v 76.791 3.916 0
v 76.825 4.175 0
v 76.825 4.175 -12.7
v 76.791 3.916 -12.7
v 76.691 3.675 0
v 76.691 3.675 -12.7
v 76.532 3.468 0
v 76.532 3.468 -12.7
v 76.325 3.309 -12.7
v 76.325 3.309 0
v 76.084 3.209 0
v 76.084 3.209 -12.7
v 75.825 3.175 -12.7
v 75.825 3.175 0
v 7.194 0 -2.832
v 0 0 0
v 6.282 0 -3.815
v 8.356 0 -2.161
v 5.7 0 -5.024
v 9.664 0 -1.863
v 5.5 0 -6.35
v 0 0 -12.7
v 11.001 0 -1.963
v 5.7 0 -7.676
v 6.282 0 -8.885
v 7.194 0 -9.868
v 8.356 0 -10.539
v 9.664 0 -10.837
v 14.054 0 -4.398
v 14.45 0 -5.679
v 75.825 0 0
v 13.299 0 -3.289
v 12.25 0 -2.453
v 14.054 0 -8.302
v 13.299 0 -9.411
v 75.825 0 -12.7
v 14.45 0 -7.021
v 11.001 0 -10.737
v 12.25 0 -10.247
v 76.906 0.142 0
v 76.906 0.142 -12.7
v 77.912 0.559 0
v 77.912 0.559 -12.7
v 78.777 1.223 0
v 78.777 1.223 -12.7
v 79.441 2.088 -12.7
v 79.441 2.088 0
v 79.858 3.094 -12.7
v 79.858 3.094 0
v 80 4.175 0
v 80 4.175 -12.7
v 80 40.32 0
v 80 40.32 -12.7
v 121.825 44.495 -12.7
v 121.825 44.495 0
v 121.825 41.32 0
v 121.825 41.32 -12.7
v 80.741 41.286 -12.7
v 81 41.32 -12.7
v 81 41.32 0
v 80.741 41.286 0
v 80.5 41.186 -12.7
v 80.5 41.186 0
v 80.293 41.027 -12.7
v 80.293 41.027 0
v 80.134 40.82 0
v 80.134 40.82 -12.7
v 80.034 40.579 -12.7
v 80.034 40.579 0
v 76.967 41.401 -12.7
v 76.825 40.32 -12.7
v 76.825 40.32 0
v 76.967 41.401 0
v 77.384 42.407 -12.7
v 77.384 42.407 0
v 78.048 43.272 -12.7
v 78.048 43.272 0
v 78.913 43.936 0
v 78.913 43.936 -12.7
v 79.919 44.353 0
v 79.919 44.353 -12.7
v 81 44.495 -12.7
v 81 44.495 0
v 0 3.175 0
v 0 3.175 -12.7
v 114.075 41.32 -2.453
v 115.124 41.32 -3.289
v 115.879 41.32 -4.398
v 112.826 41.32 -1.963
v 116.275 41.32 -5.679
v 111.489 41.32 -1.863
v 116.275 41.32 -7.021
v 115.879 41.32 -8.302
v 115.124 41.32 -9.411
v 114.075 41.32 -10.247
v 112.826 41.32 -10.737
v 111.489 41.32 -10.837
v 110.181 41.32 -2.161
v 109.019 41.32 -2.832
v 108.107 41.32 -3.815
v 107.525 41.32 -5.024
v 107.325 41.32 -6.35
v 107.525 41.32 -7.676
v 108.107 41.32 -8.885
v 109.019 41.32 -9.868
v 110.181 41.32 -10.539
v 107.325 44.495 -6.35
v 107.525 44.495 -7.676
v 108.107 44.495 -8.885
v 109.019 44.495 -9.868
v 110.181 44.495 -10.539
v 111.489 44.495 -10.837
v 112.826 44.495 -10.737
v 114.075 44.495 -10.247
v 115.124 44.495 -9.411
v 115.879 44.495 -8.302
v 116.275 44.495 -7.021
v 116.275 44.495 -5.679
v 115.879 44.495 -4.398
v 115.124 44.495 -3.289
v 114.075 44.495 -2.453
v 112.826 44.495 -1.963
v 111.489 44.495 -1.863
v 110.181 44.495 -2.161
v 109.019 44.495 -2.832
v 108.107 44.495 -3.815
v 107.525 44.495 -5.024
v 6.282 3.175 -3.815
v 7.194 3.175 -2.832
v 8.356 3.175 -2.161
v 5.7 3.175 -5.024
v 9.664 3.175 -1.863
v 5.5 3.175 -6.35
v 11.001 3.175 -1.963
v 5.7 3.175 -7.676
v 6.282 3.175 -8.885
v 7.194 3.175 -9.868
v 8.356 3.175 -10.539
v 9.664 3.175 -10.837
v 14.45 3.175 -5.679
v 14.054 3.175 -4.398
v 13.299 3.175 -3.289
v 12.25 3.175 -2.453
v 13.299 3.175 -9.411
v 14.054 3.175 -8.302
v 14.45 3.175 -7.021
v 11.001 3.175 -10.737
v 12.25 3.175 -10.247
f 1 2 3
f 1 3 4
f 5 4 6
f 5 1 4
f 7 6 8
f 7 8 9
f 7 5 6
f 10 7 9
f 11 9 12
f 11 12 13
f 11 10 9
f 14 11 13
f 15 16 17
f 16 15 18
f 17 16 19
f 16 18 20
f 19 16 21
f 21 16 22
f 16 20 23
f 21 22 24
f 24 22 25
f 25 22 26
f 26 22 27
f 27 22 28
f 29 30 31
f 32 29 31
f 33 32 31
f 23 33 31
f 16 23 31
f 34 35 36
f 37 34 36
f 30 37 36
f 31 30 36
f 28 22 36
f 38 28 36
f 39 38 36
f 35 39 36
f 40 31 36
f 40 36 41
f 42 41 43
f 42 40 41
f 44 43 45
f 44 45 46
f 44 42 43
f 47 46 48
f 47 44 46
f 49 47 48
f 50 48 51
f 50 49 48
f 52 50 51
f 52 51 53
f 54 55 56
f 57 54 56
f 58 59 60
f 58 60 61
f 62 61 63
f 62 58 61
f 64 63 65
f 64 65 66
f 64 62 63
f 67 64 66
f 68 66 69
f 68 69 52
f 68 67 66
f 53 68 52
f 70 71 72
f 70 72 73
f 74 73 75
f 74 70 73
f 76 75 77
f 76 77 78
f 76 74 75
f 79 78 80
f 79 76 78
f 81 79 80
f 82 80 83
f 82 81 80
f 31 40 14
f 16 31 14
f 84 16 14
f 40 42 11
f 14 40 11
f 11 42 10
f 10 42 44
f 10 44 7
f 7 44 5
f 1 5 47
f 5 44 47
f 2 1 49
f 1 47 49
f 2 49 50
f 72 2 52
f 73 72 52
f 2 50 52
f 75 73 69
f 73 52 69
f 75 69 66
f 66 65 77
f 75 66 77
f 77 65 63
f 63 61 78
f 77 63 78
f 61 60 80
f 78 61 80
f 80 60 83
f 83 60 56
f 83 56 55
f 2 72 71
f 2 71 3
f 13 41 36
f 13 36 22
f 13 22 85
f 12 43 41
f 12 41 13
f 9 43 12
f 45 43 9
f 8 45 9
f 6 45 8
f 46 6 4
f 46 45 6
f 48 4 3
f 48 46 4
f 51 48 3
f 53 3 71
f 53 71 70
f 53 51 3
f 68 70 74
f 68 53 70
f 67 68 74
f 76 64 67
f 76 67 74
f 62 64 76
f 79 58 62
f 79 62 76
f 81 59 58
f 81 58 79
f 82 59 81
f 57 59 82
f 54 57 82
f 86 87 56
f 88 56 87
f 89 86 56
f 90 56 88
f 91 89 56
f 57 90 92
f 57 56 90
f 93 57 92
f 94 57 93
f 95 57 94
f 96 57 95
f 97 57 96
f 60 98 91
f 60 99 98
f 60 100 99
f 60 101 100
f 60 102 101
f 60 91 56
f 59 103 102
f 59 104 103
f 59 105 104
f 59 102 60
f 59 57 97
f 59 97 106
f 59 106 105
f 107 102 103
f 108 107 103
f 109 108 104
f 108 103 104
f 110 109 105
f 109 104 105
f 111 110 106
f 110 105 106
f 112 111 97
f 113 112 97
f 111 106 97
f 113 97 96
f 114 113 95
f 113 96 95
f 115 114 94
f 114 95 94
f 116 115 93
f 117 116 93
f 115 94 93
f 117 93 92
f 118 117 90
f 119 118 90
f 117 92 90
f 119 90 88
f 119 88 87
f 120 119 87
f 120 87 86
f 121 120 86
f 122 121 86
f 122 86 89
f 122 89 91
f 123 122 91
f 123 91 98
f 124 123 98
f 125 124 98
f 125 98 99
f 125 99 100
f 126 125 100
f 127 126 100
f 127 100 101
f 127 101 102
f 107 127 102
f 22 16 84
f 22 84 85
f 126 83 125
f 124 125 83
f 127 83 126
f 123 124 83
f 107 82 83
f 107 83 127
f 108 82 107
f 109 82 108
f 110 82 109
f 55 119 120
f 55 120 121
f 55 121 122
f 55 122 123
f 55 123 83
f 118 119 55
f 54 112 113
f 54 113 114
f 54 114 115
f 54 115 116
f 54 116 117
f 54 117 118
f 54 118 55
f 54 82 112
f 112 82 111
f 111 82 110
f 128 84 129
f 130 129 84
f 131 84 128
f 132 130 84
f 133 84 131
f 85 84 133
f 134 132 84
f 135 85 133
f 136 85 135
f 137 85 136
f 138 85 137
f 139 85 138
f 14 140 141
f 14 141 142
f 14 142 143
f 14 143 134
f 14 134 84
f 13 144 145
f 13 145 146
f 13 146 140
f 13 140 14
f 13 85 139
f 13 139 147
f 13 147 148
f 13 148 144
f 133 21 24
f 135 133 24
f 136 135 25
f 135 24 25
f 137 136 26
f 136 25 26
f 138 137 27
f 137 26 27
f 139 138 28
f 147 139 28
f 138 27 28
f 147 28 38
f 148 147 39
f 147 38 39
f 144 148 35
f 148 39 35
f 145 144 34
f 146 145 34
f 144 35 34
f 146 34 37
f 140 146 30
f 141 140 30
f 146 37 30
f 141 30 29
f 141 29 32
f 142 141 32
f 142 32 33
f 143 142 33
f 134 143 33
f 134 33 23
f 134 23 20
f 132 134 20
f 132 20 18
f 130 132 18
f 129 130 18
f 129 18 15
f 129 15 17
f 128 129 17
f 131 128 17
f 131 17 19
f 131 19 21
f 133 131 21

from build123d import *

# Parameters (mm, degrees)
SKETCH1_W                    = 80
SKETCH1_H                    = 12.7
BOSS_EXTRUDE1_DEPTH          = 3.175
EDGE_FLANGE1_STRIP_W         = 14.7
EDGE_FLANGE1_STRIP_H         = 3.175
EDGE_FLANGE1_STRIP_CUT_DEPTH = 12.7
EDGE_FLANGE1_DEPTH           = 12.7
EDGE_FLANGE2_STRIP_W         = 14.7
EDGE_FLANGE2_STRIP_H         = 3.175
EDGE_FLANGE2_STRIP_CUT_DEPTH = 12.7
EDGE_FLANGE2_DEPTH           = 12.7
M8_CLEARANCE_HOLE1_D         = 9


# Sheet-metal steps are written as plain solids
with BuildPart() as part:
    # Sketch1 → Boss-Extrude1 (new body)
    with BuildSketch(Plane(origin=(0, 0, 0), x_dir=(1, 0, 0), z_dir=(0, 1, 0))):
        with Locations((40, 6.35)):
            Rectangle(SKETCH1_W, SKETCH1_H)
    extrude(amount=BOSS_EXTRUDE1_DEPTH)

    # Edge-Flange1 strip (across the edge) → Edge-Flange1 strip cut (cut)
    with BuildSketch(Plane(origin=(80, 3.175, 0), x_dir=(-1, 0, 0), z_dir=(0, 0, -1))):
        with Locations((-3.175, -1.5875)):
            Rectangle(EDGE_FLANGE1_STRIP_W, EDGE_FLANGE1_STRIP_H)
    extrude(amount=EDGE_FLANGE1_STRIP_CUT_DEPTH, mode=Mode.SUBTRACT)

    # Edge-Flange1 section (across the edge) → Edge-Flange1 (add)
    with BuildSketch(Plane(origin=(80, 3.175, 0), x_dir=(-1, 0, 0), z_dir=(0, 0, -1))):
        with BuildLine():
            Line((0, 1), (0, 41.32))
            Line((0, 41.32), (3.175, 41.32))
            Line((3.175, 41.32), (3.175, 1))
            ThreePointArc((3.175, 1), (3.467893219, 0.292893219), (4.175, 0))
            Line((4.175, 0), (4.175, -3.175))
            ThreePointArc((4.175, -3.175), (1.222829189, -1.952170811), (0, 1))
        make_face()
    extrude(amount=EDGE_FLANGE1_DEPTH)

    # Edge-Flange2 strip (across the edge) → Edge-Flange2 strip cut (cut)
    with BuildSketch(Plane(origin=(80, 44.495, -12.7), x_dir=(0, -1, 0), z_dir=(0, 0, 1))):
        with Locations((-3.175, -1.5875)):
            Rectangle(EDGE_FLANGE2_STRIP_W, EDGE_FLANGE2_STRIP_H)
    extrude(amount=EDGE_FLANGE2_STRIP_CUT_DEPTH, mode=Mode.SUBTRACT)

    # Edge-Flange2 section (across the edge) → Edge-Flange2 (add)
    with BuildSketch(Plane(origin=(80, 44.495, -12.7), x_dir=(0, -1, 0), z_dir=(0, 0, 1))):
        with BuildLine():
            Line((0, 1), (0, 41.825))
            Line((0, 41.825), (3.175, 41.825))
            Line((3.175, 41.825), (3.175, 1))
            ThreePointArc((3.175, 1), (3.467893219, 0.292893219), (4.175, 0))
            Line((4.175, 0), (4.175, -3.175))
            ThreePointArc((4.175, -3.175), (1.222829189, -1.952170811), (0, 1))
        make_face()
    extrude(amount=EDGE_FLANGE2_DEPTH)

    # M8 Clearance Hole1 (through all)
    with Locations(Plane(origin=(0, 44.495, 0), x_dir=(1, 0, 0), z_dir=(0, 1, 0))):
        with Locations((111.825, 6.35), (10, 6.35)):
            Hole(M8_CLEARANCE_HOLE1_D / 2)


solid = part.part
